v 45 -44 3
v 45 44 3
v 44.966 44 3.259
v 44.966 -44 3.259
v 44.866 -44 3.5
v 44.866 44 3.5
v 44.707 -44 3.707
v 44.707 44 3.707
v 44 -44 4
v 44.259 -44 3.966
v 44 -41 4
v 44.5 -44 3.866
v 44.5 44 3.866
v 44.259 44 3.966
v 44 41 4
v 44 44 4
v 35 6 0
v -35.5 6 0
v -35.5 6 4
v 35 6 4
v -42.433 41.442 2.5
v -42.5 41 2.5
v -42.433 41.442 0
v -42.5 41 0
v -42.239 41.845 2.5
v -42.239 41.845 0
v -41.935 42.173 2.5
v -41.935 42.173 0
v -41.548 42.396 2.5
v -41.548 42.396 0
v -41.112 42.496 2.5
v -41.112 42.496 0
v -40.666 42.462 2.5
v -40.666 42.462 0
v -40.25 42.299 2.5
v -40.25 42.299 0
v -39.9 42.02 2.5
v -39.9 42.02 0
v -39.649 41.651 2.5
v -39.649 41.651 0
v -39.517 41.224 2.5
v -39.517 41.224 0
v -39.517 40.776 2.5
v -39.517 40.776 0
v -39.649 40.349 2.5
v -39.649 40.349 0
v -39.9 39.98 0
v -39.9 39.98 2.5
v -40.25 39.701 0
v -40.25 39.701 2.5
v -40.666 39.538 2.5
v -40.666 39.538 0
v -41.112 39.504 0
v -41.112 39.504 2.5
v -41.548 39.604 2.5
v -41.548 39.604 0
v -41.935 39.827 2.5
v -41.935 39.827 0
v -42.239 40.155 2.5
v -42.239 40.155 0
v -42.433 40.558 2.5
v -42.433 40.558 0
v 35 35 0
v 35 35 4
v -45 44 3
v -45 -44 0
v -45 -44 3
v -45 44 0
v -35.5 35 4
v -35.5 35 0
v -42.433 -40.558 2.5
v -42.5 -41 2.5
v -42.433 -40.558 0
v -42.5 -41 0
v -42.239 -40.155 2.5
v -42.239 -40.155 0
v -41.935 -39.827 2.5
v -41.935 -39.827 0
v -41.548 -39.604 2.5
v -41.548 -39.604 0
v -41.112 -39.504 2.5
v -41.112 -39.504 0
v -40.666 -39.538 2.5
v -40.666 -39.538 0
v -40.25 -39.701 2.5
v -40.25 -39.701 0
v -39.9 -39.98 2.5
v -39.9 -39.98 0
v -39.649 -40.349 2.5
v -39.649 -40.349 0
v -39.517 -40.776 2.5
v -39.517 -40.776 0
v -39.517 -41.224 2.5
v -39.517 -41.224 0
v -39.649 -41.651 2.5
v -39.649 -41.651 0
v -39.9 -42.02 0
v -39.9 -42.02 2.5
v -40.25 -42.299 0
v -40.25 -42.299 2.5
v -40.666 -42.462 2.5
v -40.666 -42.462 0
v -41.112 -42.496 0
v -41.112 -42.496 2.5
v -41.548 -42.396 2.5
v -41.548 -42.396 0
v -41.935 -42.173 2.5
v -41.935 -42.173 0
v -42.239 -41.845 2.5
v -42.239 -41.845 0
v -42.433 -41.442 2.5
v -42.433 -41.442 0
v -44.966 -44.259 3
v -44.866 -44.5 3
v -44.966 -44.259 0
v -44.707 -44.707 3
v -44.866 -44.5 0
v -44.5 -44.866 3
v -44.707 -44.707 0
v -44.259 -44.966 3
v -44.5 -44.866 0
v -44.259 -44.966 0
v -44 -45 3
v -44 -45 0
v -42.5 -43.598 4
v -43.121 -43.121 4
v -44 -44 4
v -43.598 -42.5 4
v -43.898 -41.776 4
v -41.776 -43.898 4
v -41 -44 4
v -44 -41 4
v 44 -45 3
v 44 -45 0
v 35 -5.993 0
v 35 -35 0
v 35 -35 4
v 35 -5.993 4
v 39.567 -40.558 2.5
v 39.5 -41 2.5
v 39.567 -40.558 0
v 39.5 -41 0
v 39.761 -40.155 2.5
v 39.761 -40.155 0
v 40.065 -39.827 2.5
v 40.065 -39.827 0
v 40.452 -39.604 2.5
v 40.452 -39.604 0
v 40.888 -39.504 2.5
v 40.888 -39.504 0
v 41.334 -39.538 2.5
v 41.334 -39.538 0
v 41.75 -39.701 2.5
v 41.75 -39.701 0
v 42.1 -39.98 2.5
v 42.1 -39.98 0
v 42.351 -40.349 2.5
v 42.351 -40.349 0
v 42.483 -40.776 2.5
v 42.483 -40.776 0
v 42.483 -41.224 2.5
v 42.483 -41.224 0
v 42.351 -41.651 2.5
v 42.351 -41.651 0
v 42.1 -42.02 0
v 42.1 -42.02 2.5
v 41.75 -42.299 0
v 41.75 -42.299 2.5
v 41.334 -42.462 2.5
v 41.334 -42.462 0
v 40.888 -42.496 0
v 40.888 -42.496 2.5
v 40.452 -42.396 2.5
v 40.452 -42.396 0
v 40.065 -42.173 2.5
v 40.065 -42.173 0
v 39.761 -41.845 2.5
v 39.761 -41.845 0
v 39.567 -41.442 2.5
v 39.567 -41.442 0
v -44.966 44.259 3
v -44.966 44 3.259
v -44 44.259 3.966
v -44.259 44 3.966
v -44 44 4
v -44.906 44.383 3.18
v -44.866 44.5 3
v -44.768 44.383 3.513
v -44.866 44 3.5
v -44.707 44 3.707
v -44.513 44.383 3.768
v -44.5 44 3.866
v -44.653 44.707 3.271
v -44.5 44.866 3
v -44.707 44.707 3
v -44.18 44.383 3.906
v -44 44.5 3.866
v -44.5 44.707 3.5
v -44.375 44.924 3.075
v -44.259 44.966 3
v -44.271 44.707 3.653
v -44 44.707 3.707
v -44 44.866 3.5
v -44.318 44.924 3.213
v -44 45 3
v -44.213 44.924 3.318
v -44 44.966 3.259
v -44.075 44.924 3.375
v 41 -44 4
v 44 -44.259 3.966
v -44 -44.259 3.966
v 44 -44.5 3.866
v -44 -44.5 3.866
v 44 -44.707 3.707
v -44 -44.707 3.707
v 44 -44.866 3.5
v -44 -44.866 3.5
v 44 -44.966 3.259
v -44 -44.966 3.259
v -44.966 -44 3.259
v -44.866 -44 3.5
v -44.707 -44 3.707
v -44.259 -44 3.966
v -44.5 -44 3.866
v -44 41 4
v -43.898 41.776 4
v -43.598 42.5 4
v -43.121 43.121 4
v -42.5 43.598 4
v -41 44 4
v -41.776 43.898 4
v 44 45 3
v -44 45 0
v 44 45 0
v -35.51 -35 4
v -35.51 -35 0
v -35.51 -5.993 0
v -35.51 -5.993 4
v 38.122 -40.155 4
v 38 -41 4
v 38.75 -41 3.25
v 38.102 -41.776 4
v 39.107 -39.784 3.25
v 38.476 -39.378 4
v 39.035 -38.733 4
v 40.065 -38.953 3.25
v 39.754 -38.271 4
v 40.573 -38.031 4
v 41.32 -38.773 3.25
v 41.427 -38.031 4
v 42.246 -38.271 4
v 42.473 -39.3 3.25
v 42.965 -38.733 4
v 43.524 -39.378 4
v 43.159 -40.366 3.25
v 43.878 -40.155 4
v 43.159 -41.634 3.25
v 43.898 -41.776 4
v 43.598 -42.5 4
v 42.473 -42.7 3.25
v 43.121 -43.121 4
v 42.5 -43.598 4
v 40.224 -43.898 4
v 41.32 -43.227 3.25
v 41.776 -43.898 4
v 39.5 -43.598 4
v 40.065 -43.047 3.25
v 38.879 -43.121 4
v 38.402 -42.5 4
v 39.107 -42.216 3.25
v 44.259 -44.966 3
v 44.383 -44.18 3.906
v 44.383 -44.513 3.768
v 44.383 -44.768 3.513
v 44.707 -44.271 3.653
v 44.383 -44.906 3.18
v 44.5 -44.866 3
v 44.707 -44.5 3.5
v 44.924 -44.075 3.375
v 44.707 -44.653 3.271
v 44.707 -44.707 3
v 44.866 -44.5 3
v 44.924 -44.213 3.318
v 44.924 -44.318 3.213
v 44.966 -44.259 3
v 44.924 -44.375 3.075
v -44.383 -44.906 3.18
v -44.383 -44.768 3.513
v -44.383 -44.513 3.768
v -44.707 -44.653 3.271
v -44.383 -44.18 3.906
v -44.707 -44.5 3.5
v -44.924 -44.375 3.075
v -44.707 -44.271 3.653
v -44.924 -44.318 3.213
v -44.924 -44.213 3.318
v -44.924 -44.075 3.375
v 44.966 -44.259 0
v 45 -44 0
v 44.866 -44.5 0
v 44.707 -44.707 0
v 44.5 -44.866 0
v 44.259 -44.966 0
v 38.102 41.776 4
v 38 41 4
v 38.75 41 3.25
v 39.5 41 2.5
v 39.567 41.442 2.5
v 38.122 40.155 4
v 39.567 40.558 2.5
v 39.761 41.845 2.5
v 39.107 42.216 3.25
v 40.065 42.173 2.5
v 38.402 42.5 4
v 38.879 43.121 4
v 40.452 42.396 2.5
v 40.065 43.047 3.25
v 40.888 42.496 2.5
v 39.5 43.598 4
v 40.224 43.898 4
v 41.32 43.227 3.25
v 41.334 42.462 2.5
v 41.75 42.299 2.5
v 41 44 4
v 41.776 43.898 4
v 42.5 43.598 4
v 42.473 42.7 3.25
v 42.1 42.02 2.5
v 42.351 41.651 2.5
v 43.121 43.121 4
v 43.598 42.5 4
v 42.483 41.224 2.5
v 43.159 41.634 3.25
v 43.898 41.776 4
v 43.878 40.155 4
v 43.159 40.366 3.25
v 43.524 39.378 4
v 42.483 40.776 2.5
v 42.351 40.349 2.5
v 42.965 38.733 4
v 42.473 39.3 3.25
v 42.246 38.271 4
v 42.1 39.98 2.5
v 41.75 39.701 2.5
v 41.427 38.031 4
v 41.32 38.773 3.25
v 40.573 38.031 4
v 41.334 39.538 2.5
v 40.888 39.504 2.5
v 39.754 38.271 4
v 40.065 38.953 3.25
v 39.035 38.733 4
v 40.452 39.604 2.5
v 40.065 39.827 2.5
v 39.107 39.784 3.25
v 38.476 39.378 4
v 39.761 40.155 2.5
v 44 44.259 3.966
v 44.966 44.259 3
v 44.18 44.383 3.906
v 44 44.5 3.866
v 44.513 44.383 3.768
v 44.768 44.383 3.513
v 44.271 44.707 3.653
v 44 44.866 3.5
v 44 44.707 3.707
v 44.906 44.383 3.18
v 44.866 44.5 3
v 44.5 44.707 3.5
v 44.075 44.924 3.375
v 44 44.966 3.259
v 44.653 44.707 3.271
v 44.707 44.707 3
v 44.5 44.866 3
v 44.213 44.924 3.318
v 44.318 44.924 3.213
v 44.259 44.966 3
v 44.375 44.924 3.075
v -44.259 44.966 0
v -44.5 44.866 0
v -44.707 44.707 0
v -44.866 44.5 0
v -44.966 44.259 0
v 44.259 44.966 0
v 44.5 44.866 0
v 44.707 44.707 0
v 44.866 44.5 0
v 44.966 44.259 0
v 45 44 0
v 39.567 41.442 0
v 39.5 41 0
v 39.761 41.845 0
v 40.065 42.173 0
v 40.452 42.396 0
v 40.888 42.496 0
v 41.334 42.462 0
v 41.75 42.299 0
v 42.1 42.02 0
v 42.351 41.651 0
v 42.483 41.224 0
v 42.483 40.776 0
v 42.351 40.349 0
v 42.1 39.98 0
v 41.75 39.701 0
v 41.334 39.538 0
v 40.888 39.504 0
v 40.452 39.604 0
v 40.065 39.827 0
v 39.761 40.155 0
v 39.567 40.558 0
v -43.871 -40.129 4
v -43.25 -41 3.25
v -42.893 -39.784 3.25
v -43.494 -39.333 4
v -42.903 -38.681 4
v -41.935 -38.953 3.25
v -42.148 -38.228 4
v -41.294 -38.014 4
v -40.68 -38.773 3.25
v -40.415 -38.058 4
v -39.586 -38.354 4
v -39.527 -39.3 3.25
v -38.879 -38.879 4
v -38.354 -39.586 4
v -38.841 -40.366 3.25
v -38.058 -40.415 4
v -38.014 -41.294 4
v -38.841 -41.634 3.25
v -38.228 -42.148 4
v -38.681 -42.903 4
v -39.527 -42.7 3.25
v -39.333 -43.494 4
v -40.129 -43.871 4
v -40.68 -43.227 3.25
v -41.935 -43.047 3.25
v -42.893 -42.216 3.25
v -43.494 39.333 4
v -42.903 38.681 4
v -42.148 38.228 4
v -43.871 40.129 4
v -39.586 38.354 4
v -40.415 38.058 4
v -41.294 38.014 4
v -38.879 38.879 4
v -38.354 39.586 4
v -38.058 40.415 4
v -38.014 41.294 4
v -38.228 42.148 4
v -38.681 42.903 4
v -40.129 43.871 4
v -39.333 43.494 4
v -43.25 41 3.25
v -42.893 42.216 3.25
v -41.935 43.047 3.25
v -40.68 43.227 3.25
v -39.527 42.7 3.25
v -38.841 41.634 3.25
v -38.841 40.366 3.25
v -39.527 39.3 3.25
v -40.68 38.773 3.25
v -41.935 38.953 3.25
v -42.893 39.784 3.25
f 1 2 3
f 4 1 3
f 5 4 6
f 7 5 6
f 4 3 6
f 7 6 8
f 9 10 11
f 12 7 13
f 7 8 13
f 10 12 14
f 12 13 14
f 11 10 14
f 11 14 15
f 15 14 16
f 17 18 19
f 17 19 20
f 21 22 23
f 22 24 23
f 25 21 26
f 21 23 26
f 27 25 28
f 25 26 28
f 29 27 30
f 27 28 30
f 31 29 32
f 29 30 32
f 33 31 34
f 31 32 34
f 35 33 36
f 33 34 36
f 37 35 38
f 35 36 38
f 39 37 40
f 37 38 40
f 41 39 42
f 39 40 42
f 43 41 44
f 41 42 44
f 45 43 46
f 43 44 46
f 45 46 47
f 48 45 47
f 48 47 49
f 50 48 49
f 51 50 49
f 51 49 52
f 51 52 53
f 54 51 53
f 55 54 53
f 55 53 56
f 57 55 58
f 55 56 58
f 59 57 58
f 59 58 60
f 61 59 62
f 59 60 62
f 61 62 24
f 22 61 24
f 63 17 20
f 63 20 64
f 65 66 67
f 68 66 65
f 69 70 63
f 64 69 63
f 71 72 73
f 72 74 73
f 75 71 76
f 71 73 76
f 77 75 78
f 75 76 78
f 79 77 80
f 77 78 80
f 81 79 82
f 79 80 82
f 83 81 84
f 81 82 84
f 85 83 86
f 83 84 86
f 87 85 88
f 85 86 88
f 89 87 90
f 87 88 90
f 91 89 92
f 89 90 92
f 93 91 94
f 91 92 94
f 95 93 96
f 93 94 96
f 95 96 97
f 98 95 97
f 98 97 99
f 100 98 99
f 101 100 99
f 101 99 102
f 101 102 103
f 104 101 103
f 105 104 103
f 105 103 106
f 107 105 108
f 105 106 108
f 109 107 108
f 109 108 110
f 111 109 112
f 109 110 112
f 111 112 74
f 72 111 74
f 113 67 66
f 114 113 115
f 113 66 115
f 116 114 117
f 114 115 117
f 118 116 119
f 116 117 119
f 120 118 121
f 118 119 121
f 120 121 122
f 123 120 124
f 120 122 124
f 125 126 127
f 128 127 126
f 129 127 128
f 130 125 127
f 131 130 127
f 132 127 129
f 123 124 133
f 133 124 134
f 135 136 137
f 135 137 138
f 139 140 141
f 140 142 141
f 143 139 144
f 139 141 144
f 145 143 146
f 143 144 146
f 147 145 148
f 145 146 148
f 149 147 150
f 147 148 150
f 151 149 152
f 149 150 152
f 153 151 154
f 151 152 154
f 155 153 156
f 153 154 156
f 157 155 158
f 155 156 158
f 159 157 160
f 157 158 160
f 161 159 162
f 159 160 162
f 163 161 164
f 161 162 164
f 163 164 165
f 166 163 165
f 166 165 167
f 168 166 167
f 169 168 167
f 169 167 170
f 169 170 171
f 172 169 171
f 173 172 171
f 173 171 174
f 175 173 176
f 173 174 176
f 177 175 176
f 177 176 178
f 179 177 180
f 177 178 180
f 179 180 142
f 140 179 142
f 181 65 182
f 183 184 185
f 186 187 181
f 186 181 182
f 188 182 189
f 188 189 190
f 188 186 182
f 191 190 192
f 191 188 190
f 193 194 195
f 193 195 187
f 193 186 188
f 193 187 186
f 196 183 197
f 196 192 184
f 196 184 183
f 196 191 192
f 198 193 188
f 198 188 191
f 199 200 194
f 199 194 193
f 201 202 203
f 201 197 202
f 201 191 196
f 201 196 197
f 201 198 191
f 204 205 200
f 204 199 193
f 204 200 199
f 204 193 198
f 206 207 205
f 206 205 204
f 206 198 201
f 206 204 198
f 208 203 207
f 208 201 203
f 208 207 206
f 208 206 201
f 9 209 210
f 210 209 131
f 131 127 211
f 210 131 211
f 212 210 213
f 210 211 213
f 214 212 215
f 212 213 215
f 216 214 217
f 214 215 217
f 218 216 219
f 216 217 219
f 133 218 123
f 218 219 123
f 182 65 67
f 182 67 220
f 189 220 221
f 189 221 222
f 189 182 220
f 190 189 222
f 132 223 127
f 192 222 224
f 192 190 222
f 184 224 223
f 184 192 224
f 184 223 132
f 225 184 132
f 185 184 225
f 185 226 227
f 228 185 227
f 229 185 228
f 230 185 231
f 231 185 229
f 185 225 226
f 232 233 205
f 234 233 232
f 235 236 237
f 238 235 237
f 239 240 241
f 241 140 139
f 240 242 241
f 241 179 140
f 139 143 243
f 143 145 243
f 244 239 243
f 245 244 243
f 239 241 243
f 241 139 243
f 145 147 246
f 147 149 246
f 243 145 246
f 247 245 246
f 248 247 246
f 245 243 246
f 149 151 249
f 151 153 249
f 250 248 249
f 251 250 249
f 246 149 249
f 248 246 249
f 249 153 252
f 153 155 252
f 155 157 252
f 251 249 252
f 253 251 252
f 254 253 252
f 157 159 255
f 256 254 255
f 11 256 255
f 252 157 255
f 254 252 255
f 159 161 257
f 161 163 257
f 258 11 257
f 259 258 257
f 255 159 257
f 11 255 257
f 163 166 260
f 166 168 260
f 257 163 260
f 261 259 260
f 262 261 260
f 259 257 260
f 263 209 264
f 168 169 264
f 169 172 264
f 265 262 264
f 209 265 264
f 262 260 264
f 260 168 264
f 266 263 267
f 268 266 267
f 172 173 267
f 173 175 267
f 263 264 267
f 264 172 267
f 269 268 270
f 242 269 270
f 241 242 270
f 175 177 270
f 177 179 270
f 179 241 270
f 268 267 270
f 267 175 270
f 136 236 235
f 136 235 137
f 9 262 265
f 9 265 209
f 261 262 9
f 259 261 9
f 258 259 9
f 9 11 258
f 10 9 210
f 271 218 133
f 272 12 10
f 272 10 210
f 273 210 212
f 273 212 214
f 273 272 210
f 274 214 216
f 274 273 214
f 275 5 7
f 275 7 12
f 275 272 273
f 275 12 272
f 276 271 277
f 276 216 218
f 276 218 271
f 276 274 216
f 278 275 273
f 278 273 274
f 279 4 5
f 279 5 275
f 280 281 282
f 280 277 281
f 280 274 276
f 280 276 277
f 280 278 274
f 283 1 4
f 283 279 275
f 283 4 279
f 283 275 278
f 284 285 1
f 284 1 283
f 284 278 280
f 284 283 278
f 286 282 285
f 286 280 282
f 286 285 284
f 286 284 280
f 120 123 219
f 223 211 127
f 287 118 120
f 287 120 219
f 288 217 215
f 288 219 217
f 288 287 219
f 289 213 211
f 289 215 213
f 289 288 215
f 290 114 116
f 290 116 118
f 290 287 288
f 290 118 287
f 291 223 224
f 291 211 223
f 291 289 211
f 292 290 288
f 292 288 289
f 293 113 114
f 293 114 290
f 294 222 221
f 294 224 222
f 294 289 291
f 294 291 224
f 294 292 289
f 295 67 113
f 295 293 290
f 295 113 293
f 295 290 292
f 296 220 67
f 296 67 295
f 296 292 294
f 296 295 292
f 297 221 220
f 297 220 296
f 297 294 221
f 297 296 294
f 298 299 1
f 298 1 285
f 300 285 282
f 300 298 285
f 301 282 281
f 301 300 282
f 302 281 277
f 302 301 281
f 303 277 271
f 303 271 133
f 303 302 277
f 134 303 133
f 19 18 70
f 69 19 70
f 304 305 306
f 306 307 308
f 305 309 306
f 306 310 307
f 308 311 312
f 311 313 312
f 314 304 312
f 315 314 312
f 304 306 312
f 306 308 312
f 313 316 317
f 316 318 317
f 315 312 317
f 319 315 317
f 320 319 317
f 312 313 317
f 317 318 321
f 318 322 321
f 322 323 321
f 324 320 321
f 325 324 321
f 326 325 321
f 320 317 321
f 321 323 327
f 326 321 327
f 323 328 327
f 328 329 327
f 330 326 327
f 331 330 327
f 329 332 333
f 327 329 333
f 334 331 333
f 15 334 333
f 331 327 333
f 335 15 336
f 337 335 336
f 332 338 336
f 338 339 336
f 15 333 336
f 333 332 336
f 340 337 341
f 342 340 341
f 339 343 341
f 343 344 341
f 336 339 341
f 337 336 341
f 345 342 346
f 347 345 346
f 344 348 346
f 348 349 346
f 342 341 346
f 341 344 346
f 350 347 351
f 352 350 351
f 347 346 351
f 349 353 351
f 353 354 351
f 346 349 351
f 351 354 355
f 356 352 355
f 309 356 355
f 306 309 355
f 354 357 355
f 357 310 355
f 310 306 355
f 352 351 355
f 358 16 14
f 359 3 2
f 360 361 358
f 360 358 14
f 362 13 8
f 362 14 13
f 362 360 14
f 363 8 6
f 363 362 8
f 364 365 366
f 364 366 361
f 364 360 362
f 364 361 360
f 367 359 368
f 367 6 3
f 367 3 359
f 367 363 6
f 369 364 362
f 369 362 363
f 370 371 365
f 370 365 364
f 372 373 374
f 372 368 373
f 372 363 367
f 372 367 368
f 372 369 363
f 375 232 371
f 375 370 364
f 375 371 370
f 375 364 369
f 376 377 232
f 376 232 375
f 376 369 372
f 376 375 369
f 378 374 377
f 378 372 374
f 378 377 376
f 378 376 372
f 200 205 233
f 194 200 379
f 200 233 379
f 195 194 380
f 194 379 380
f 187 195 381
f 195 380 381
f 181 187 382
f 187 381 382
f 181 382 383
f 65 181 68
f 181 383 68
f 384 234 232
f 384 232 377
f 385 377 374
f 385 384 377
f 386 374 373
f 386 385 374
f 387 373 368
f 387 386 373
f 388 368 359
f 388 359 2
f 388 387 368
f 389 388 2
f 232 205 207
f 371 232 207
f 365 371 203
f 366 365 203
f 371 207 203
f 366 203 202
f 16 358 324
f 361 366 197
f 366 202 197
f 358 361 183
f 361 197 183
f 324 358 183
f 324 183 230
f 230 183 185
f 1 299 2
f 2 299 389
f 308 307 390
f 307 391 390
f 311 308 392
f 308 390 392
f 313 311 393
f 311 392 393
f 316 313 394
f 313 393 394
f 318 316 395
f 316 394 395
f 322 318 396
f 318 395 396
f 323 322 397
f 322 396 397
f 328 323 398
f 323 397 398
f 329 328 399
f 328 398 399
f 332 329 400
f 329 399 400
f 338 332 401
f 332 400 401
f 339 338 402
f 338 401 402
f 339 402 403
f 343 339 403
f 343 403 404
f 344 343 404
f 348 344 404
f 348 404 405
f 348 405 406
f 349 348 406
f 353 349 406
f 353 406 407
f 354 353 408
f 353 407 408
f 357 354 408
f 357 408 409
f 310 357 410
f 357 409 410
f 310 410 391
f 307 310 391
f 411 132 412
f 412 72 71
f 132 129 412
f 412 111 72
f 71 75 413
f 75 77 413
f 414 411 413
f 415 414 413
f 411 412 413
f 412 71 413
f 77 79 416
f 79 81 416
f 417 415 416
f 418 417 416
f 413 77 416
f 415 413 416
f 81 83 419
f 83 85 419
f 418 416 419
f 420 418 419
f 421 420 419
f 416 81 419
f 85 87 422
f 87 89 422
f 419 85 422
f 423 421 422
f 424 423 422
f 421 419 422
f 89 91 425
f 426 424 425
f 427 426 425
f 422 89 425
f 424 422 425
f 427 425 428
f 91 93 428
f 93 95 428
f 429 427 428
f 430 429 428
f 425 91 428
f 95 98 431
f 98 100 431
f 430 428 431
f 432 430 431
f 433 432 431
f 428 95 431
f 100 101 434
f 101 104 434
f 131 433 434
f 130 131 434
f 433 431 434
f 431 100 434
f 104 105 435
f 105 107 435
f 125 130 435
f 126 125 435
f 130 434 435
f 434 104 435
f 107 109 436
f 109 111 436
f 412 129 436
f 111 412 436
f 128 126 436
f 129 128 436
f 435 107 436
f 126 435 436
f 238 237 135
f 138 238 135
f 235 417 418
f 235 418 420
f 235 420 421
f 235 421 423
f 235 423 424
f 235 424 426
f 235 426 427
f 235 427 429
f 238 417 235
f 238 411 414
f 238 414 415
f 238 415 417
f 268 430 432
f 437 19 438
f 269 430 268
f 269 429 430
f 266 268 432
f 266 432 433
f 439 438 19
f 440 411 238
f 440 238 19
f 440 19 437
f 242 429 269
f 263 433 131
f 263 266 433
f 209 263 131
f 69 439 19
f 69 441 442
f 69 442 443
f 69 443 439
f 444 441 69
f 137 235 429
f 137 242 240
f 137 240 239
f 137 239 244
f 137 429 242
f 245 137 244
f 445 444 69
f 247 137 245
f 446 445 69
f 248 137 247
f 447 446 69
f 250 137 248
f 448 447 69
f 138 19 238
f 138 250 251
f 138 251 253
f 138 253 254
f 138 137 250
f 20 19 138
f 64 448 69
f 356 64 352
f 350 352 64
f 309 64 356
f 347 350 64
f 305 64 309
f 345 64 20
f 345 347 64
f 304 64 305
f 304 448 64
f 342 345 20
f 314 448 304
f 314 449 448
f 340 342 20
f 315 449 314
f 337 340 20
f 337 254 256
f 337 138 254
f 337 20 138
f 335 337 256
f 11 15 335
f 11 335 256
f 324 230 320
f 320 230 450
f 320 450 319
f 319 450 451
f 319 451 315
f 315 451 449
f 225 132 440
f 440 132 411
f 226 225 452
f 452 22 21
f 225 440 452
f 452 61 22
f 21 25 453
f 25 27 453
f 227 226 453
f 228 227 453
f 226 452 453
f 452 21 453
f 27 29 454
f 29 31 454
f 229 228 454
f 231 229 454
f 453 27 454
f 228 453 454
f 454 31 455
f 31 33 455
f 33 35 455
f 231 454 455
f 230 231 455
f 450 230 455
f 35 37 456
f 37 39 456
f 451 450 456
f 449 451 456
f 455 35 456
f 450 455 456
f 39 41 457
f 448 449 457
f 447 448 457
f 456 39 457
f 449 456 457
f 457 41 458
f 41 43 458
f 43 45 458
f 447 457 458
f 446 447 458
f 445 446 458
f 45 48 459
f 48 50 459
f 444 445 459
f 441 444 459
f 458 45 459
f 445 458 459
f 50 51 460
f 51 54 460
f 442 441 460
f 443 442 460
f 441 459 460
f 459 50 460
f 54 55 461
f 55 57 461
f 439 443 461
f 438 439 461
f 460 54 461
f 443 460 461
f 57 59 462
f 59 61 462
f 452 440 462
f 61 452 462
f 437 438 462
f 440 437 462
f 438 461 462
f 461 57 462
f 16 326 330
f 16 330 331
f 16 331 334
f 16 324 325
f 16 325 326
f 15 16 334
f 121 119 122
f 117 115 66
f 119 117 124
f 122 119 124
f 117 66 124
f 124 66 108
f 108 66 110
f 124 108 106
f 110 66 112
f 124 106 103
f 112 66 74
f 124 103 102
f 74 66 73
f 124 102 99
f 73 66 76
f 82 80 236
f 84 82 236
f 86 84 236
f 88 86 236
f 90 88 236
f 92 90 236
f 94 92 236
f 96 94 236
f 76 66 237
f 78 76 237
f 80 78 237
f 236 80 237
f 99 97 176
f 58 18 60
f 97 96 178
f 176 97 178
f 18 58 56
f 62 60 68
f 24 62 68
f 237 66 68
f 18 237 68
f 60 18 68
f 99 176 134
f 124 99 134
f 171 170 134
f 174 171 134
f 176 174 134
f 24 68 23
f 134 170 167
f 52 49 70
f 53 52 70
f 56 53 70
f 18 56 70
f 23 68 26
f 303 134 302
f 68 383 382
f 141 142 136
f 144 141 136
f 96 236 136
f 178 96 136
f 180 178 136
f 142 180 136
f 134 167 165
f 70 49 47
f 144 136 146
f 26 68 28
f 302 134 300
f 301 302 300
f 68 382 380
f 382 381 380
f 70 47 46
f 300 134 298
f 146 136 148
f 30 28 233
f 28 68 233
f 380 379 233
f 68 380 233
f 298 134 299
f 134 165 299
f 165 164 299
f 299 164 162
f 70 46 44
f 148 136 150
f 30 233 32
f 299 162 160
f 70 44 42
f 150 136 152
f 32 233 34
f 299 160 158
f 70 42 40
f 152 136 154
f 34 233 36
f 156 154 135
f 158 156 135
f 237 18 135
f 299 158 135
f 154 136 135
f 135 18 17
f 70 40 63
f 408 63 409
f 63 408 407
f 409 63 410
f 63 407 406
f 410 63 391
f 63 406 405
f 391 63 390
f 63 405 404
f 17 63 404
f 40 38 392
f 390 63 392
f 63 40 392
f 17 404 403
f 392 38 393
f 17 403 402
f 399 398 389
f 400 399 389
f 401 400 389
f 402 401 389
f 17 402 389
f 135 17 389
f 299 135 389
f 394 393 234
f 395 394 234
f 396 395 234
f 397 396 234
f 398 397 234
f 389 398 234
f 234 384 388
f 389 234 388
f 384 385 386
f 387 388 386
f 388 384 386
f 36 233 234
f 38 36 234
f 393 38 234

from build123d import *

# Parameters (mm, degrees)
F0_W           = 90
F0_H           = 90
F0_W_2         = 70.5104
F0_H_2         = 29.0068
F0_W_3         = 70.5
F0_H_3         = 29
F1_DEPTH       = 4
F3_D           = 3
F3_CSINK_D     = 6
F3_CSINK_ANGLE = 90
F4_T1_DEPTH    = 88
F4_T3_DEPTH    = 88
F4_T5_DEPTH    = 5.5
F4_S9_W        = 1
F4_S9_H        = 1
F4_T10_DEPTH   = 1
F4_S15_W       = 1
F4_S15_H       = 1
F4_T16_DEPTH   = 1
F4_S21_W       = 1
F4_S21_H       = 1
F4_T22_DEPTH   = 1
F4_S27_W       = 1
F4_S27_H       = 1
F4_T28_DEPTH   = 1


# Not quite as in the source:
# - a fillet or chamfer that OpenCascade refuses, or shapes differently, is made with other operations: its cross-section is extruded or revolved along the edge and cut away or added


with BuildPart() as f1:
    # F0 (on Top) → F1 (new body)
    with BuildSketch(Plane.XY):
        Rectangle(F0_W, F0_H)
        with Locations((-0.2552, -20.4966)):
            Rectangle(F0_W_2, F0_H_2, mode=Mode.SUBTRACT)
        with Locations((-0.25, 20.5)):
            Rectangle(F0_W_3, F0_H_3, mode=Mode.SUBTRACT)
    extrude(amount=F1_DEPTH)

    # F3 (through all)
    with Locations(Plane.XY.offset(4)):
        with Locations((-41, 41), (41, 41), (41, -41), (-41, -41)):
            CounterSinkHole(F3_D / 2, F3_CSINK_D / 2, counter_sink_angle=F3_CSINK_ANGLE)

    # F4: fillet of radius 1 on 8 edges, made by hand

    # F4_s2 → F4_t1 (cut)
    with BuildSketch(Plane.YZ.offset(-44)):
        with BuildLine():
            ThreePointArc((45, 3), (44.7071067812, 3.7071067812), (44, 4))
            Line((44, 4), (45, 4))
            Line((45, 4), (45, 3))
        make_face()
        with BuildLine():
            ThreePointArc((-44, 4), (-44.7071067812, 3.7071067812), (-45, 3))
            Line((-45, 3), (-45, 4))
            Line((-45, 4), (-44, 4))
        make_face()
    extrude(amount=F4_T1_DEPTH, mode=Mode.SUBTRACT)

    # F4_s4 → F4_t3 (cut)
    with BuildSketch(Plane.XZ.offset(-44)):
        with BuildLine():
            ThreePointArc((-45, 3), (-44.7071067812, 3.7071067812), (-44, 4))
            Line((-44, 4), (-45, 4))
            Line((-45, 4), (-45, 3))
        make_face()
        with BuildLine():
            ThreePointArc((45, 3), (44.7071067812, 3.7071067812), (44, 4))
            Line((44, 4), (45, 4))
            Line((45, 4), (45, 3))
        make_face()
    extrude(amount=F4_T3_DEPTH, mode=Mode.SUBTRACT)

    # F4_s6 → F4_t5 (cut)
    with BuildSketch(Plane.XY.offset(-2.5)):
        with BuildLine():
            ThreePointArc((45, -44), (44.7071067812, -44.7071067812), (44, -45))
            Line((44, -45), (45, -45))
            Line((45, -45), (45, -44))
        make_face()
        with BuildLine():
            ThreePointArc((44, 45), (44.7071067812, 44.7071067812), (45, 44))
            Line((45, 44), (45, 45))
            Line((45, 45), (44, 45))
        make_face()
        with BuildLine():
            ThreePointArc((-44, 45), (-44.7071067812, 44.7071067812), (-45, 44))
            Line((-45, 44), (-45, 45))
            Line((-45, 45), (-44, 45))
        make_face()
        with BuildLine():
            ThreePointArc((-45, -44), (-44.7071067812, -44.7071067812), (-44, -45))
            Line((-44, -45), (-45, -45))
            Line((-45, -45), (-45, -44))
        make_face()
    extrude(amount=F4_T5_DEPTH, mode=Mode.SUBTRACT)


with BuildPart() as f4_tool8:
    # F4_s9 → F4_t10 (new body)
    with BuildSketch(Plane.XZ.offset(-44)):
        with Locations((44.5, 3.5)):
            Rectangle(F4_S9_W, F4_S9_H)
    extrude(amount=-F4_T10_DEPTH)

    # F4_s11 → F4_t12 (revolve, cut)
    with BuildSketch(Plane(origin=(44, 44, 3), x_dir=(-0.7071067812, 0, -0.7071067812), z_dir=(0.7071067812, 0, -0.7071067812))):
        with BuildLine():
            ThreePointArc((0, -1), (1, 0), (0, 1))
            Line((0, 1), (0, -1))
        make_face()
    revolve(axis=Axis((44, 44, 3), (0, 1, 0)), mode=Mode.SUBTRACT)


with BuildPart() as f1_1:
    add(f1.part)

    # F4_t7: cut F4_tool8
    add(f4_tool8.part, mode=Mode.SUBTRACT)


with BuildPart() as f4_tool14:
    # F4_s15 → F4_t16 (new body)
    with BuildSketch(Plane.XZ.offset(-44)):
        with Locations((-44.5, 3.5)):
            Rectangle(F4_S15_W, F4_S15_H)
    extrude(amount=-F4_T16_DEPTH)

    # F4_s17 → F4_t18 (revolve, cut)
    with BuildSketch(Plane(origin=(-44, 44, 3), x_dir=(0.7071067812, 0, -0.7071067812), z_dir=(0.7071067812, 0, 0.7071067812))):
        with BuildLine():
            ThreePointArc((0, -1), (1, 0), (0, 1))
            Line((0, 1), (0, -1))
        make_face()
    revolve(axis=Axis((-44, 44, 3), (0, 1, 0)), mode=Mode.SUBTRACT)


with BuildPart() as f1_2:
    add(f1_1.part)

    # F4_t13: cut F4_tool14
    add(f4_tool14.part, mode=Mode.SUBTRACT)


with BuildPart() as f4_tool20:
    # F4_s21 → F4_t22 (new body)
    with BuildSketch(Plane.YZ.offset(-44)):
        with Locations((-44.5, 3.5)):
            Rectangle(F4_S21_W, F4_S21_H)
    extrude(amount=-F4_T22_DEPTH)

    # F4_s23 → F4_t24 (revolve, cut)
    with BuildSketch(Plane(origin=(-44, -44, 3), x_dir=(0, 0.7071067812, -0.7071067812), z_dir=(0, 0.7071067812, 0.7071067812))):
        with BuildLine():
            ThreePointArc((0, -1), (1, 0), (0, 1))
            Line((0, 1), (0, -1))
        make_face()
    revolve(axis=Axis((-44, -44, 3), (-1, 0, 0)), mode=Mode.SUBTRACT)


with BuildPart() as f1_3:
    add(f1_2.part)

    # F4_t19: cut F4_tool20
    add(f4_tool20.part, mode=Mode.SUBTRACT)


with BuildPart() as f4_tool26:
    # F4_s27 → F4_t28 (new body)
    with BuildSketch(Plane.YZ.offset(44)):
        with Locations((-44.5, 3.5)):
            Rectangle(F4_S27_W, F4_S27_H)
    extrude(amount=F4_T28_DEPTH)

    # F4_s29 → F4_t30 (revolve, cut)
    with BuildSketch(Plane(origin=(44, -44, 3), x_dir=(0, 0.7071067812, -0.7071067812), z_dir=(0, -0.7071067812, -0.7071067812))):
        with BuildLine():
            ThreePointArc((0, -1), (1, 0), (0, 1))
            Line((0, 1), (0, -1))
        make_face()
    revolve(axis=Axis((44, -44, 3), (1, 0, 0)), mode=Mode.SUBTRACT)


with BuildPart() as f1_4:
    add(f1_3.part)

    # F4_t25: cut F4_tool26
    add(f4_tool26.part, mode=Mode.SUBTRACT)


solid = f1_4.part
